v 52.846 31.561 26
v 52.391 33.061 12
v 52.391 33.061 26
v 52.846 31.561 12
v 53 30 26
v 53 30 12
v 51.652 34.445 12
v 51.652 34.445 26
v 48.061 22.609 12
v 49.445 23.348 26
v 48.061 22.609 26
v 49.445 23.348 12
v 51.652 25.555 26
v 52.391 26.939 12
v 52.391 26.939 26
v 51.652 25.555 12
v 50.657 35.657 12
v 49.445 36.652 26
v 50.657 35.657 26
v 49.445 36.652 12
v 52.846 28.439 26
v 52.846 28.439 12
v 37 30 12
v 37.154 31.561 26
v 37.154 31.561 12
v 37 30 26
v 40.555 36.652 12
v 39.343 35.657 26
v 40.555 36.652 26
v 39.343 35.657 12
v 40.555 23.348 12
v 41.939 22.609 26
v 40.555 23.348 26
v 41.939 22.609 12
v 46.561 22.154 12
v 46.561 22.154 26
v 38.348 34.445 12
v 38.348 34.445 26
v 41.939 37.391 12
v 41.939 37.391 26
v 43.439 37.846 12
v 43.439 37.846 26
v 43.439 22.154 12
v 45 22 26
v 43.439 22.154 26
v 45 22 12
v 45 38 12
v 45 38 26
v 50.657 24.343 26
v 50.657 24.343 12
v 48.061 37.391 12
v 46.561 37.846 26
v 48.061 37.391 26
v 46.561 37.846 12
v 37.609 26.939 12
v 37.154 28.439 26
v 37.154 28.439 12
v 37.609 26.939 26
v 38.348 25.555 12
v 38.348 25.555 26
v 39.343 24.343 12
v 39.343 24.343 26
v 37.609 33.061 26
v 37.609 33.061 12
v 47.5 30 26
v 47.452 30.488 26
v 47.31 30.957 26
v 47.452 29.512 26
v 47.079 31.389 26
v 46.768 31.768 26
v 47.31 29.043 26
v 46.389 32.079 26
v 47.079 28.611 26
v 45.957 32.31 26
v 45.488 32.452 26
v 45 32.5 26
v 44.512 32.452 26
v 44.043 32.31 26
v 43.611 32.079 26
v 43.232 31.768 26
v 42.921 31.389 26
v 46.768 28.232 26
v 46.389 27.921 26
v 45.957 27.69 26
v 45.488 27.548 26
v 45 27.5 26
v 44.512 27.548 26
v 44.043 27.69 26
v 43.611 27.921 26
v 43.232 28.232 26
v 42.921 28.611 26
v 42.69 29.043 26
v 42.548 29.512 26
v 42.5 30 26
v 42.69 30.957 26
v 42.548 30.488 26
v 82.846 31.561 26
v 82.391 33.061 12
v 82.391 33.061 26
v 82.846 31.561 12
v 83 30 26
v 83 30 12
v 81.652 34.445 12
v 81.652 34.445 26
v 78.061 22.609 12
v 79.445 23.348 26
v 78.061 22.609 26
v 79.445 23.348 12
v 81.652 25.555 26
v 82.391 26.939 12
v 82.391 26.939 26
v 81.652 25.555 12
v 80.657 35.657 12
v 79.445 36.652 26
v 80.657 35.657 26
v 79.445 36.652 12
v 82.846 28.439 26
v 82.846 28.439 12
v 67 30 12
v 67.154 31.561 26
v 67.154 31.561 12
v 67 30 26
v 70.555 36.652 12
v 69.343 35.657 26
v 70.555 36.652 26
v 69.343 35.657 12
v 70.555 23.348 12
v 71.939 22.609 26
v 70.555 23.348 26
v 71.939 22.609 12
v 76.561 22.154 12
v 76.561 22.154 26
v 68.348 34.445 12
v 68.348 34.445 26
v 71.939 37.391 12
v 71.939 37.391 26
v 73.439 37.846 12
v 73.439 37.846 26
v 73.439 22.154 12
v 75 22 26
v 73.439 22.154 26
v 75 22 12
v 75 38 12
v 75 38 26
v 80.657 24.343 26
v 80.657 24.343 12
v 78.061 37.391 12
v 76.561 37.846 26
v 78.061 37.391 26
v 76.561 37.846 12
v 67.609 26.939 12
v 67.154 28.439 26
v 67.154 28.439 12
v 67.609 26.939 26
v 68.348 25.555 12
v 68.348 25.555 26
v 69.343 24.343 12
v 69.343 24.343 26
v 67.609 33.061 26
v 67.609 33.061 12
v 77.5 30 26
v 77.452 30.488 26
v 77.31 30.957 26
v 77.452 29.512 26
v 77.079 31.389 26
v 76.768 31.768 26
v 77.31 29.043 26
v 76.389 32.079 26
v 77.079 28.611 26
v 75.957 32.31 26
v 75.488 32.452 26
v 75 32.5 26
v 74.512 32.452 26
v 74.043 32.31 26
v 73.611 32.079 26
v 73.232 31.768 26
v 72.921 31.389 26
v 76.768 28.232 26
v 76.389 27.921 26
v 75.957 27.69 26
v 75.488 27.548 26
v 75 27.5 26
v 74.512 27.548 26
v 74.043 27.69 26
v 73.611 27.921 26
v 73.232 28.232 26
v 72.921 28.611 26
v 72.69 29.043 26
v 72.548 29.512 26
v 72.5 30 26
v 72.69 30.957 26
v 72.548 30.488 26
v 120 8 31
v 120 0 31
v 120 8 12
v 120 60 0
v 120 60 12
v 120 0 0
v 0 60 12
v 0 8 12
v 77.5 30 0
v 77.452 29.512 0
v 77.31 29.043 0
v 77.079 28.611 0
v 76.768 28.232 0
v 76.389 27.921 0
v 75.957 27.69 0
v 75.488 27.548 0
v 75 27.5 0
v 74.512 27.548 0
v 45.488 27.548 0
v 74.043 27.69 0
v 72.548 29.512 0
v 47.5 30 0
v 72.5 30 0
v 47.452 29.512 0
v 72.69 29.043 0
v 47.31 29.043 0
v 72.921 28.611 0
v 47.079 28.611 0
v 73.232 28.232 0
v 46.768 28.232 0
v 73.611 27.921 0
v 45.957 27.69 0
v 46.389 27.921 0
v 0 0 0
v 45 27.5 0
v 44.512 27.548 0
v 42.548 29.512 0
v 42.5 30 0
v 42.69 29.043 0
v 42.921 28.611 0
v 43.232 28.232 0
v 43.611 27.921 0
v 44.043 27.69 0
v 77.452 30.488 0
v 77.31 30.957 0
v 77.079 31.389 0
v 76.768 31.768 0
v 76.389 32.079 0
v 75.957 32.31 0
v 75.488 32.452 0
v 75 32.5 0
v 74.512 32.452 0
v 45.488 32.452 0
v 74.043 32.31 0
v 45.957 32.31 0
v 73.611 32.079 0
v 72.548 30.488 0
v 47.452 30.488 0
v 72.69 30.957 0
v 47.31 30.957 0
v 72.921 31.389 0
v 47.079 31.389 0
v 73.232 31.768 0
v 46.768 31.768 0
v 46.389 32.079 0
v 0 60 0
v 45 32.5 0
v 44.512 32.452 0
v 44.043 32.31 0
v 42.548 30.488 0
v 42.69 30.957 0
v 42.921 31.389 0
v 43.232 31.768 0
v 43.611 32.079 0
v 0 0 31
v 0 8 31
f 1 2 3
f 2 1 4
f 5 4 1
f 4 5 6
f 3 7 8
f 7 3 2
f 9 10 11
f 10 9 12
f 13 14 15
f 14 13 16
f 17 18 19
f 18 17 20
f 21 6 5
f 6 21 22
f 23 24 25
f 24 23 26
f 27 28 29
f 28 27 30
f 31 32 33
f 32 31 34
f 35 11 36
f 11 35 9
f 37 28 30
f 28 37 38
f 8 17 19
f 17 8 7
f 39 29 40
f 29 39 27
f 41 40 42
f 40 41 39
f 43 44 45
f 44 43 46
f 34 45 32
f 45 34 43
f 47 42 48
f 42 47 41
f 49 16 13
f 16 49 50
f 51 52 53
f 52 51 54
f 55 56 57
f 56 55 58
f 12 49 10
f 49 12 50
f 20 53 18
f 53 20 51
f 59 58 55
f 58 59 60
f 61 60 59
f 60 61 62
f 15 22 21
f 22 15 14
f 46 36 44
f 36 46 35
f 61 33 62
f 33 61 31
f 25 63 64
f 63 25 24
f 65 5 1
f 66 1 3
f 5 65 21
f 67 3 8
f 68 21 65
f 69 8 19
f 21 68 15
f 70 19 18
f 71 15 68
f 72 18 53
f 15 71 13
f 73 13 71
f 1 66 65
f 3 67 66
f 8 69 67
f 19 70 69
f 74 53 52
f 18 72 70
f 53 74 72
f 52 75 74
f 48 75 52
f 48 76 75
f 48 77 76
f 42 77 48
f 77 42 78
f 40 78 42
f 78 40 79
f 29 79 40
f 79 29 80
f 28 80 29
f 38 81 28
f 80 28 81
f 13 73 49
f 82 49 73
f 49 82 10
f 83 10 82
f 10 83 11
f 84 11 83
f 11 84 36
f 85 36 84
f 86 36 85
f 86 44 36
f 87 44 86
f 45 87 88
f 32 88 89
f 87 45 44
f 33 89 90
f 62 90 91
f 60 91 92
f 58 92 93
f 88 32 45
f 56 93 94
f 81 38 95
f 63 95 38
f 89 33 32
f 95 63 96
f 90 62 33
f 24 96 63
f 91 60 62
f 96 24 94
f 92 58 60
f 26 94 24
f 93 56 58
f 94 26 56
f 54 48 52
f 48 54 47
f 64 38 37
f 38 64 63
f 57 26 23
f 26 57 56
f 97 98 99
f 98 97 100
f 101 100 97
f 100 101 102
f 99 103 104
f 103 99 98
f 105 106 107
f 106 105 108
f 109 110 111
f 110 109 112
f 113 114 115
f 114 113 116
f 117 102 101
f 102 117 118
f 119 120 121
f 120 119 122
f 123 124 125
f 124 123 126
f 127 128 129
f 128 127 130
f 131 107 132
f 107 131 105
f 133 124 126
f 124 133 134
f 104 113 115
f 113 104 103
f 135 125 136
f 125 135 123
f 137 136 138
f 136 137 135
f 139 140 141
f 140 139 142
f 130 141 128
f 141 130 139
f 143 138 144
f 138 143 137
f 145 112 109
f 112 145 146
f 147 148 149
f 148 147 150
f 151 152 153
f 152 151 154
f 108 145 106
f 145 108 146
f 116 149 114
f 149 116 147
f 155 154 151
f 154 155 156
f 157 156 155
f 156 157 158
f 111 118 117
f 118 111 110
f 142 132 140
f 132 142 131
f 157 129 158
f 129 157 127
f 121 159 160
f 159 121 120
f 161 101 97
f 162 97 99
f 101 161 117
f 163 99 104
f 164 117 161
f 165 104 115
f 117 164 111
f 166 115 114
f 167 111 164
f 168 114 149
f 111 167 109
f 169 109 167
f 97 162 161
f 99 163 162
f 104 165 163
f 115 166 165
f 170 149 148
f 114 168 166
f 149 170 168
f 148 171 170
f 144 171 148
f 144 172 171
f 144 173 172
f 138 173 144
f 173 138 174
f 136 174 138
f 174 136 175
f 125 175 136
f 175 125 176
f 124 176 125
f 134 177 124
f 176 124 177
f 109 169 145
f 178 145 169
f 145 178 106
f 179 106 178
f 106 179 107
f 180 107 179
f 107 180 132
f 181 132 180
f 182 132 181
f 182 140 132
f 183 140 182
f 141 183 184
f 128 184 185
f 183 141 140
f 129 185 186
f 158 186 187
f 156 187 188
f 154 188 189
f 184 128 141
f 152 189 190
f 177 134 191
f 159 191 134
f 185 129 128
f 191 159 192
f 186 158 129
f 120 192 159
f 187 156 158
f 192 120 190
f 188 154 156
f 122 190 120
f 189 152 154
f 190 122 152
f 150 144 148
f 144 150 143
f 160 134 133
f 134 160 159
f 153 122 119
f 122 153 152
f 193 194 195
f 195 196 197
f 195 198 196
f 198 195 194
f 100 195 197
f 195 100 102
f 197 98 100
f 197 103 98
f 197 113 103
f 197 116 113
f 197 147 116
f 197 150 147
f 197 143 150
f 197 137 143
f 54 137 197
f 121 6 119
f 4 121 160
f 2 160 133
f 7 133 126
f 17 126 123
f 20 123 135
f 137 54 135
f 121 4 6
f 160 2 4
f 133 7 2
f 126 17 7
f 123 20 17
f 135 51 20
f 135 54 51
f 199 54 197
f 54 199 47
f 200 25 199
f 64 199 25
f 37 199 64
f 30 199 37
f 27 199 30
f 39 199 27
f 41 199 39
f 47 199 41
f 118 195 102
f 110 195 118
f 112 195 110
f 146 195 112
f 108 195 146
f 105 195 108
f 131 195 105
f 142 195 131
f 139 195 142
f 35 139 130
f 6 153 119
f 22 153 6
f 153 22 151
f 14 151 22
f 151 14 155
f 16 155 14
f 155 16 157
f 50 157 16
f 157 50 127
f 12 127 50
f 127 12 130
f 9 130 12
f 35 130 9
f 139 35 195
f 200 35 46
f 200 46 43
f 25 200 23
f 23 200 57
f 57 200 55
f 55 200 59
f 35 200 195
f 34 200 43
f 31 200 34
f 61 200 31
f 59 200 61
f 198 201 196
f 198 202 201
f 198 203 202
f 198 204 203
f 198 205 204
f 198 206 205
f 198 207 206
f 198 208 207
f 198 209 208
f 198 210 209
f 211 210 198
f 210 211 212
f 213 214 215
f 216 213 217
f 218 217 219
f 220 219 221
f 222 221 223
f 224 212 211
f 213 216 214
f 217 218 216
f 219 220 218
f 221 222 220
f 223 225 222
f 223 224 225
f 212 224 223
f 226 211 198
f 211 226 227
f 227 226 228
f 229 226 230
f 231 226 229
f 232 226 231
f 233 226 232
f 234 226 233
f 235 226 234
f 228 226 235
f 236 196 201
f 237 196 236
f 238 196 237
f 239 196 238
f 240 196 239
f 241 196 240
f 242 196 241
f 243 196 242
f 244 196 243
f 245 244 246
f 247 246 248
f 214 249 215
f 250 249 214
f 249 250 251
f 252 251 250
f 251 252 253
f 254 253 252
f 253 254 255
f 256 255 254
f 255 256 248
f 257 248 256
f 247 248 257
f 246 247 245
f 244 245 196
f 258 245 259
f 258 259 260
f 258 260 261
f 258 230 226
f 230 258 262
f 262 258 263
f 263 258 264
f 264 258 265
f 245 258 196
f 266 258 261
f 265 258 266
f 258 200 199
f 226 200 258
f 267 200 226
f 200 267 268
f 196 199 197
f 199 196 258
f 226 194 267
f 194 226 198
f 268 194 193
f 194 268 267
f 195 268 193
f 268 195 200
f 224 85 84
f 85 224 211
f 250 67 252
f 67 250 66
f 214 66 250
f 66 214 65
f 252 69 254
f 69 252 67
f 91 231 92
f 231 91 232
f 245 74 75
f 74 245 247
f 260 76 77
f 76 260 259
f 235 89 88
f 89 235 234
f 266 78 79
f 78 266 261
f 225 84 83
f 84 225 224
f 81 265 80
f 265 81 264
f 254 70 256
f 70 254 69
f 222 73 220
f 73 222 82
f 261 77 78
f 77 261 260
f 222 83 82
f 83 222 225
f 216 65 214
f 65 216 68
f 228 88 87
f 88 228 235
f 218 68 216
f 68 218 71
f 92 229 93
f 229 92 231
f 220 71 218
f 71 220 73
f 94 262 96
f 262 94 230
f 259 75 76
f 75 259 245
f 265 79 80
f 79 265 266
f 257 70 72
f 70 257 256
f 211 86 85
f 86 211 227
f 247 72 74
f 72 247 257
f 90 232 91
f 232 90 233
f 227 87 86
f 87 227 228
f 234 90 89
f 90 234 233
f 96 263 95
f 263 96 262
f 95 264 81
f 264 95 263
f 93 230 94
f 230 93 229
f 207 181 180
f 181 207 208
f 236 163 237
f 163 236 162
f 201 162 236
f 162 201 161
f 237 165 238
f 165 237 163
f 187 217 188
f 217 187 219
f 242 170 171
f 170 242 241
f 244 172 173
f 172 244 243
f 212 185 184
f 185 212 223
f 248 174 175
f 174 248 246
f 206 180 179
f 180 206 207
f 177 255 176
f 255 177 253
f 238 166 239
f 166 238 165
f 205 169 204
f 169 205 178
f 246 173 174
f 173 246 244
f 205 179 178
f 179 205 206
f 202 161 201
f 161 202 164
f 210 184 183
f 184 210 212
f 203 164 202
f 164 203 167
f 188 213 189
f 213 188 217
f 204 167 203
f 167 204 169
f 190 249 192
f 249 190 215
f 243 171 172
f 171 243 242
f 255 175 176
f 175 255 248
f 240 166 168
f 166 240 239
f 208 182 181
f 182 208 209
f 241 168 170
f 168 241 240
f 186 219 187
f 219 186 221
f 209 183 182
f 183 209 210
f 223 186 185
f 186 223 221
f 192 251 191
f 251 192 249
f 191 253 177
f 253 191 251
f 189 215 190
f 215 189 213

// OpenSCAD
$fn = 32;

// ----------------------------------------------------------------------
// Drill jig: fence jig
// ----------------------------------------------------------------------

// --- parameters (mm) ---
plate_l = 120;            // plate length, X
plate_w = 60;             // plate width, Y
plate_t = 12;             // plate thickness
boss_d = 16;              // guide boss diameter
boss_h = 15;              // boss height above the plate
guide_d = 5;              // guide hole diameter
boss_pitch = 30;          // boss pitch
fence_h = 20;             // fence height above the plate
fence_t = 8;              // fence thickness

n_boss = 2;  // guide bosses
boss_x0 = (plate_l - (n_boss - 1) * boss_pitch) / 2;  // first boss X
boss_top = plate_t - 1 + boss_h;  // boss crown height
fence_top = plate_t - 1 + fence_h;  // fence crown height
total_h = max([fence_top, boss_top]);  // overall height

difference() {
  union() {
  cube([plate_l, plate_w, plate_t]);
  for (i = [0 : n_boss - 1])
    translate([boss_x0 + i * boss_pitch, plate_w / 2, plate_t - 1])
      cylinder(h = boss_h, d = boss_d);
  translate([0, 0, plate_t - 1]) cube([plate_l, fence_t, fence_h]);
  }
  for (i = [0 : n_boss - 1])
    translate([boss_x0 + i * boss_pitch, plate_w / 2, -1])
      cylinder(h = plate_t + boss_h, d = guide_d);
}
